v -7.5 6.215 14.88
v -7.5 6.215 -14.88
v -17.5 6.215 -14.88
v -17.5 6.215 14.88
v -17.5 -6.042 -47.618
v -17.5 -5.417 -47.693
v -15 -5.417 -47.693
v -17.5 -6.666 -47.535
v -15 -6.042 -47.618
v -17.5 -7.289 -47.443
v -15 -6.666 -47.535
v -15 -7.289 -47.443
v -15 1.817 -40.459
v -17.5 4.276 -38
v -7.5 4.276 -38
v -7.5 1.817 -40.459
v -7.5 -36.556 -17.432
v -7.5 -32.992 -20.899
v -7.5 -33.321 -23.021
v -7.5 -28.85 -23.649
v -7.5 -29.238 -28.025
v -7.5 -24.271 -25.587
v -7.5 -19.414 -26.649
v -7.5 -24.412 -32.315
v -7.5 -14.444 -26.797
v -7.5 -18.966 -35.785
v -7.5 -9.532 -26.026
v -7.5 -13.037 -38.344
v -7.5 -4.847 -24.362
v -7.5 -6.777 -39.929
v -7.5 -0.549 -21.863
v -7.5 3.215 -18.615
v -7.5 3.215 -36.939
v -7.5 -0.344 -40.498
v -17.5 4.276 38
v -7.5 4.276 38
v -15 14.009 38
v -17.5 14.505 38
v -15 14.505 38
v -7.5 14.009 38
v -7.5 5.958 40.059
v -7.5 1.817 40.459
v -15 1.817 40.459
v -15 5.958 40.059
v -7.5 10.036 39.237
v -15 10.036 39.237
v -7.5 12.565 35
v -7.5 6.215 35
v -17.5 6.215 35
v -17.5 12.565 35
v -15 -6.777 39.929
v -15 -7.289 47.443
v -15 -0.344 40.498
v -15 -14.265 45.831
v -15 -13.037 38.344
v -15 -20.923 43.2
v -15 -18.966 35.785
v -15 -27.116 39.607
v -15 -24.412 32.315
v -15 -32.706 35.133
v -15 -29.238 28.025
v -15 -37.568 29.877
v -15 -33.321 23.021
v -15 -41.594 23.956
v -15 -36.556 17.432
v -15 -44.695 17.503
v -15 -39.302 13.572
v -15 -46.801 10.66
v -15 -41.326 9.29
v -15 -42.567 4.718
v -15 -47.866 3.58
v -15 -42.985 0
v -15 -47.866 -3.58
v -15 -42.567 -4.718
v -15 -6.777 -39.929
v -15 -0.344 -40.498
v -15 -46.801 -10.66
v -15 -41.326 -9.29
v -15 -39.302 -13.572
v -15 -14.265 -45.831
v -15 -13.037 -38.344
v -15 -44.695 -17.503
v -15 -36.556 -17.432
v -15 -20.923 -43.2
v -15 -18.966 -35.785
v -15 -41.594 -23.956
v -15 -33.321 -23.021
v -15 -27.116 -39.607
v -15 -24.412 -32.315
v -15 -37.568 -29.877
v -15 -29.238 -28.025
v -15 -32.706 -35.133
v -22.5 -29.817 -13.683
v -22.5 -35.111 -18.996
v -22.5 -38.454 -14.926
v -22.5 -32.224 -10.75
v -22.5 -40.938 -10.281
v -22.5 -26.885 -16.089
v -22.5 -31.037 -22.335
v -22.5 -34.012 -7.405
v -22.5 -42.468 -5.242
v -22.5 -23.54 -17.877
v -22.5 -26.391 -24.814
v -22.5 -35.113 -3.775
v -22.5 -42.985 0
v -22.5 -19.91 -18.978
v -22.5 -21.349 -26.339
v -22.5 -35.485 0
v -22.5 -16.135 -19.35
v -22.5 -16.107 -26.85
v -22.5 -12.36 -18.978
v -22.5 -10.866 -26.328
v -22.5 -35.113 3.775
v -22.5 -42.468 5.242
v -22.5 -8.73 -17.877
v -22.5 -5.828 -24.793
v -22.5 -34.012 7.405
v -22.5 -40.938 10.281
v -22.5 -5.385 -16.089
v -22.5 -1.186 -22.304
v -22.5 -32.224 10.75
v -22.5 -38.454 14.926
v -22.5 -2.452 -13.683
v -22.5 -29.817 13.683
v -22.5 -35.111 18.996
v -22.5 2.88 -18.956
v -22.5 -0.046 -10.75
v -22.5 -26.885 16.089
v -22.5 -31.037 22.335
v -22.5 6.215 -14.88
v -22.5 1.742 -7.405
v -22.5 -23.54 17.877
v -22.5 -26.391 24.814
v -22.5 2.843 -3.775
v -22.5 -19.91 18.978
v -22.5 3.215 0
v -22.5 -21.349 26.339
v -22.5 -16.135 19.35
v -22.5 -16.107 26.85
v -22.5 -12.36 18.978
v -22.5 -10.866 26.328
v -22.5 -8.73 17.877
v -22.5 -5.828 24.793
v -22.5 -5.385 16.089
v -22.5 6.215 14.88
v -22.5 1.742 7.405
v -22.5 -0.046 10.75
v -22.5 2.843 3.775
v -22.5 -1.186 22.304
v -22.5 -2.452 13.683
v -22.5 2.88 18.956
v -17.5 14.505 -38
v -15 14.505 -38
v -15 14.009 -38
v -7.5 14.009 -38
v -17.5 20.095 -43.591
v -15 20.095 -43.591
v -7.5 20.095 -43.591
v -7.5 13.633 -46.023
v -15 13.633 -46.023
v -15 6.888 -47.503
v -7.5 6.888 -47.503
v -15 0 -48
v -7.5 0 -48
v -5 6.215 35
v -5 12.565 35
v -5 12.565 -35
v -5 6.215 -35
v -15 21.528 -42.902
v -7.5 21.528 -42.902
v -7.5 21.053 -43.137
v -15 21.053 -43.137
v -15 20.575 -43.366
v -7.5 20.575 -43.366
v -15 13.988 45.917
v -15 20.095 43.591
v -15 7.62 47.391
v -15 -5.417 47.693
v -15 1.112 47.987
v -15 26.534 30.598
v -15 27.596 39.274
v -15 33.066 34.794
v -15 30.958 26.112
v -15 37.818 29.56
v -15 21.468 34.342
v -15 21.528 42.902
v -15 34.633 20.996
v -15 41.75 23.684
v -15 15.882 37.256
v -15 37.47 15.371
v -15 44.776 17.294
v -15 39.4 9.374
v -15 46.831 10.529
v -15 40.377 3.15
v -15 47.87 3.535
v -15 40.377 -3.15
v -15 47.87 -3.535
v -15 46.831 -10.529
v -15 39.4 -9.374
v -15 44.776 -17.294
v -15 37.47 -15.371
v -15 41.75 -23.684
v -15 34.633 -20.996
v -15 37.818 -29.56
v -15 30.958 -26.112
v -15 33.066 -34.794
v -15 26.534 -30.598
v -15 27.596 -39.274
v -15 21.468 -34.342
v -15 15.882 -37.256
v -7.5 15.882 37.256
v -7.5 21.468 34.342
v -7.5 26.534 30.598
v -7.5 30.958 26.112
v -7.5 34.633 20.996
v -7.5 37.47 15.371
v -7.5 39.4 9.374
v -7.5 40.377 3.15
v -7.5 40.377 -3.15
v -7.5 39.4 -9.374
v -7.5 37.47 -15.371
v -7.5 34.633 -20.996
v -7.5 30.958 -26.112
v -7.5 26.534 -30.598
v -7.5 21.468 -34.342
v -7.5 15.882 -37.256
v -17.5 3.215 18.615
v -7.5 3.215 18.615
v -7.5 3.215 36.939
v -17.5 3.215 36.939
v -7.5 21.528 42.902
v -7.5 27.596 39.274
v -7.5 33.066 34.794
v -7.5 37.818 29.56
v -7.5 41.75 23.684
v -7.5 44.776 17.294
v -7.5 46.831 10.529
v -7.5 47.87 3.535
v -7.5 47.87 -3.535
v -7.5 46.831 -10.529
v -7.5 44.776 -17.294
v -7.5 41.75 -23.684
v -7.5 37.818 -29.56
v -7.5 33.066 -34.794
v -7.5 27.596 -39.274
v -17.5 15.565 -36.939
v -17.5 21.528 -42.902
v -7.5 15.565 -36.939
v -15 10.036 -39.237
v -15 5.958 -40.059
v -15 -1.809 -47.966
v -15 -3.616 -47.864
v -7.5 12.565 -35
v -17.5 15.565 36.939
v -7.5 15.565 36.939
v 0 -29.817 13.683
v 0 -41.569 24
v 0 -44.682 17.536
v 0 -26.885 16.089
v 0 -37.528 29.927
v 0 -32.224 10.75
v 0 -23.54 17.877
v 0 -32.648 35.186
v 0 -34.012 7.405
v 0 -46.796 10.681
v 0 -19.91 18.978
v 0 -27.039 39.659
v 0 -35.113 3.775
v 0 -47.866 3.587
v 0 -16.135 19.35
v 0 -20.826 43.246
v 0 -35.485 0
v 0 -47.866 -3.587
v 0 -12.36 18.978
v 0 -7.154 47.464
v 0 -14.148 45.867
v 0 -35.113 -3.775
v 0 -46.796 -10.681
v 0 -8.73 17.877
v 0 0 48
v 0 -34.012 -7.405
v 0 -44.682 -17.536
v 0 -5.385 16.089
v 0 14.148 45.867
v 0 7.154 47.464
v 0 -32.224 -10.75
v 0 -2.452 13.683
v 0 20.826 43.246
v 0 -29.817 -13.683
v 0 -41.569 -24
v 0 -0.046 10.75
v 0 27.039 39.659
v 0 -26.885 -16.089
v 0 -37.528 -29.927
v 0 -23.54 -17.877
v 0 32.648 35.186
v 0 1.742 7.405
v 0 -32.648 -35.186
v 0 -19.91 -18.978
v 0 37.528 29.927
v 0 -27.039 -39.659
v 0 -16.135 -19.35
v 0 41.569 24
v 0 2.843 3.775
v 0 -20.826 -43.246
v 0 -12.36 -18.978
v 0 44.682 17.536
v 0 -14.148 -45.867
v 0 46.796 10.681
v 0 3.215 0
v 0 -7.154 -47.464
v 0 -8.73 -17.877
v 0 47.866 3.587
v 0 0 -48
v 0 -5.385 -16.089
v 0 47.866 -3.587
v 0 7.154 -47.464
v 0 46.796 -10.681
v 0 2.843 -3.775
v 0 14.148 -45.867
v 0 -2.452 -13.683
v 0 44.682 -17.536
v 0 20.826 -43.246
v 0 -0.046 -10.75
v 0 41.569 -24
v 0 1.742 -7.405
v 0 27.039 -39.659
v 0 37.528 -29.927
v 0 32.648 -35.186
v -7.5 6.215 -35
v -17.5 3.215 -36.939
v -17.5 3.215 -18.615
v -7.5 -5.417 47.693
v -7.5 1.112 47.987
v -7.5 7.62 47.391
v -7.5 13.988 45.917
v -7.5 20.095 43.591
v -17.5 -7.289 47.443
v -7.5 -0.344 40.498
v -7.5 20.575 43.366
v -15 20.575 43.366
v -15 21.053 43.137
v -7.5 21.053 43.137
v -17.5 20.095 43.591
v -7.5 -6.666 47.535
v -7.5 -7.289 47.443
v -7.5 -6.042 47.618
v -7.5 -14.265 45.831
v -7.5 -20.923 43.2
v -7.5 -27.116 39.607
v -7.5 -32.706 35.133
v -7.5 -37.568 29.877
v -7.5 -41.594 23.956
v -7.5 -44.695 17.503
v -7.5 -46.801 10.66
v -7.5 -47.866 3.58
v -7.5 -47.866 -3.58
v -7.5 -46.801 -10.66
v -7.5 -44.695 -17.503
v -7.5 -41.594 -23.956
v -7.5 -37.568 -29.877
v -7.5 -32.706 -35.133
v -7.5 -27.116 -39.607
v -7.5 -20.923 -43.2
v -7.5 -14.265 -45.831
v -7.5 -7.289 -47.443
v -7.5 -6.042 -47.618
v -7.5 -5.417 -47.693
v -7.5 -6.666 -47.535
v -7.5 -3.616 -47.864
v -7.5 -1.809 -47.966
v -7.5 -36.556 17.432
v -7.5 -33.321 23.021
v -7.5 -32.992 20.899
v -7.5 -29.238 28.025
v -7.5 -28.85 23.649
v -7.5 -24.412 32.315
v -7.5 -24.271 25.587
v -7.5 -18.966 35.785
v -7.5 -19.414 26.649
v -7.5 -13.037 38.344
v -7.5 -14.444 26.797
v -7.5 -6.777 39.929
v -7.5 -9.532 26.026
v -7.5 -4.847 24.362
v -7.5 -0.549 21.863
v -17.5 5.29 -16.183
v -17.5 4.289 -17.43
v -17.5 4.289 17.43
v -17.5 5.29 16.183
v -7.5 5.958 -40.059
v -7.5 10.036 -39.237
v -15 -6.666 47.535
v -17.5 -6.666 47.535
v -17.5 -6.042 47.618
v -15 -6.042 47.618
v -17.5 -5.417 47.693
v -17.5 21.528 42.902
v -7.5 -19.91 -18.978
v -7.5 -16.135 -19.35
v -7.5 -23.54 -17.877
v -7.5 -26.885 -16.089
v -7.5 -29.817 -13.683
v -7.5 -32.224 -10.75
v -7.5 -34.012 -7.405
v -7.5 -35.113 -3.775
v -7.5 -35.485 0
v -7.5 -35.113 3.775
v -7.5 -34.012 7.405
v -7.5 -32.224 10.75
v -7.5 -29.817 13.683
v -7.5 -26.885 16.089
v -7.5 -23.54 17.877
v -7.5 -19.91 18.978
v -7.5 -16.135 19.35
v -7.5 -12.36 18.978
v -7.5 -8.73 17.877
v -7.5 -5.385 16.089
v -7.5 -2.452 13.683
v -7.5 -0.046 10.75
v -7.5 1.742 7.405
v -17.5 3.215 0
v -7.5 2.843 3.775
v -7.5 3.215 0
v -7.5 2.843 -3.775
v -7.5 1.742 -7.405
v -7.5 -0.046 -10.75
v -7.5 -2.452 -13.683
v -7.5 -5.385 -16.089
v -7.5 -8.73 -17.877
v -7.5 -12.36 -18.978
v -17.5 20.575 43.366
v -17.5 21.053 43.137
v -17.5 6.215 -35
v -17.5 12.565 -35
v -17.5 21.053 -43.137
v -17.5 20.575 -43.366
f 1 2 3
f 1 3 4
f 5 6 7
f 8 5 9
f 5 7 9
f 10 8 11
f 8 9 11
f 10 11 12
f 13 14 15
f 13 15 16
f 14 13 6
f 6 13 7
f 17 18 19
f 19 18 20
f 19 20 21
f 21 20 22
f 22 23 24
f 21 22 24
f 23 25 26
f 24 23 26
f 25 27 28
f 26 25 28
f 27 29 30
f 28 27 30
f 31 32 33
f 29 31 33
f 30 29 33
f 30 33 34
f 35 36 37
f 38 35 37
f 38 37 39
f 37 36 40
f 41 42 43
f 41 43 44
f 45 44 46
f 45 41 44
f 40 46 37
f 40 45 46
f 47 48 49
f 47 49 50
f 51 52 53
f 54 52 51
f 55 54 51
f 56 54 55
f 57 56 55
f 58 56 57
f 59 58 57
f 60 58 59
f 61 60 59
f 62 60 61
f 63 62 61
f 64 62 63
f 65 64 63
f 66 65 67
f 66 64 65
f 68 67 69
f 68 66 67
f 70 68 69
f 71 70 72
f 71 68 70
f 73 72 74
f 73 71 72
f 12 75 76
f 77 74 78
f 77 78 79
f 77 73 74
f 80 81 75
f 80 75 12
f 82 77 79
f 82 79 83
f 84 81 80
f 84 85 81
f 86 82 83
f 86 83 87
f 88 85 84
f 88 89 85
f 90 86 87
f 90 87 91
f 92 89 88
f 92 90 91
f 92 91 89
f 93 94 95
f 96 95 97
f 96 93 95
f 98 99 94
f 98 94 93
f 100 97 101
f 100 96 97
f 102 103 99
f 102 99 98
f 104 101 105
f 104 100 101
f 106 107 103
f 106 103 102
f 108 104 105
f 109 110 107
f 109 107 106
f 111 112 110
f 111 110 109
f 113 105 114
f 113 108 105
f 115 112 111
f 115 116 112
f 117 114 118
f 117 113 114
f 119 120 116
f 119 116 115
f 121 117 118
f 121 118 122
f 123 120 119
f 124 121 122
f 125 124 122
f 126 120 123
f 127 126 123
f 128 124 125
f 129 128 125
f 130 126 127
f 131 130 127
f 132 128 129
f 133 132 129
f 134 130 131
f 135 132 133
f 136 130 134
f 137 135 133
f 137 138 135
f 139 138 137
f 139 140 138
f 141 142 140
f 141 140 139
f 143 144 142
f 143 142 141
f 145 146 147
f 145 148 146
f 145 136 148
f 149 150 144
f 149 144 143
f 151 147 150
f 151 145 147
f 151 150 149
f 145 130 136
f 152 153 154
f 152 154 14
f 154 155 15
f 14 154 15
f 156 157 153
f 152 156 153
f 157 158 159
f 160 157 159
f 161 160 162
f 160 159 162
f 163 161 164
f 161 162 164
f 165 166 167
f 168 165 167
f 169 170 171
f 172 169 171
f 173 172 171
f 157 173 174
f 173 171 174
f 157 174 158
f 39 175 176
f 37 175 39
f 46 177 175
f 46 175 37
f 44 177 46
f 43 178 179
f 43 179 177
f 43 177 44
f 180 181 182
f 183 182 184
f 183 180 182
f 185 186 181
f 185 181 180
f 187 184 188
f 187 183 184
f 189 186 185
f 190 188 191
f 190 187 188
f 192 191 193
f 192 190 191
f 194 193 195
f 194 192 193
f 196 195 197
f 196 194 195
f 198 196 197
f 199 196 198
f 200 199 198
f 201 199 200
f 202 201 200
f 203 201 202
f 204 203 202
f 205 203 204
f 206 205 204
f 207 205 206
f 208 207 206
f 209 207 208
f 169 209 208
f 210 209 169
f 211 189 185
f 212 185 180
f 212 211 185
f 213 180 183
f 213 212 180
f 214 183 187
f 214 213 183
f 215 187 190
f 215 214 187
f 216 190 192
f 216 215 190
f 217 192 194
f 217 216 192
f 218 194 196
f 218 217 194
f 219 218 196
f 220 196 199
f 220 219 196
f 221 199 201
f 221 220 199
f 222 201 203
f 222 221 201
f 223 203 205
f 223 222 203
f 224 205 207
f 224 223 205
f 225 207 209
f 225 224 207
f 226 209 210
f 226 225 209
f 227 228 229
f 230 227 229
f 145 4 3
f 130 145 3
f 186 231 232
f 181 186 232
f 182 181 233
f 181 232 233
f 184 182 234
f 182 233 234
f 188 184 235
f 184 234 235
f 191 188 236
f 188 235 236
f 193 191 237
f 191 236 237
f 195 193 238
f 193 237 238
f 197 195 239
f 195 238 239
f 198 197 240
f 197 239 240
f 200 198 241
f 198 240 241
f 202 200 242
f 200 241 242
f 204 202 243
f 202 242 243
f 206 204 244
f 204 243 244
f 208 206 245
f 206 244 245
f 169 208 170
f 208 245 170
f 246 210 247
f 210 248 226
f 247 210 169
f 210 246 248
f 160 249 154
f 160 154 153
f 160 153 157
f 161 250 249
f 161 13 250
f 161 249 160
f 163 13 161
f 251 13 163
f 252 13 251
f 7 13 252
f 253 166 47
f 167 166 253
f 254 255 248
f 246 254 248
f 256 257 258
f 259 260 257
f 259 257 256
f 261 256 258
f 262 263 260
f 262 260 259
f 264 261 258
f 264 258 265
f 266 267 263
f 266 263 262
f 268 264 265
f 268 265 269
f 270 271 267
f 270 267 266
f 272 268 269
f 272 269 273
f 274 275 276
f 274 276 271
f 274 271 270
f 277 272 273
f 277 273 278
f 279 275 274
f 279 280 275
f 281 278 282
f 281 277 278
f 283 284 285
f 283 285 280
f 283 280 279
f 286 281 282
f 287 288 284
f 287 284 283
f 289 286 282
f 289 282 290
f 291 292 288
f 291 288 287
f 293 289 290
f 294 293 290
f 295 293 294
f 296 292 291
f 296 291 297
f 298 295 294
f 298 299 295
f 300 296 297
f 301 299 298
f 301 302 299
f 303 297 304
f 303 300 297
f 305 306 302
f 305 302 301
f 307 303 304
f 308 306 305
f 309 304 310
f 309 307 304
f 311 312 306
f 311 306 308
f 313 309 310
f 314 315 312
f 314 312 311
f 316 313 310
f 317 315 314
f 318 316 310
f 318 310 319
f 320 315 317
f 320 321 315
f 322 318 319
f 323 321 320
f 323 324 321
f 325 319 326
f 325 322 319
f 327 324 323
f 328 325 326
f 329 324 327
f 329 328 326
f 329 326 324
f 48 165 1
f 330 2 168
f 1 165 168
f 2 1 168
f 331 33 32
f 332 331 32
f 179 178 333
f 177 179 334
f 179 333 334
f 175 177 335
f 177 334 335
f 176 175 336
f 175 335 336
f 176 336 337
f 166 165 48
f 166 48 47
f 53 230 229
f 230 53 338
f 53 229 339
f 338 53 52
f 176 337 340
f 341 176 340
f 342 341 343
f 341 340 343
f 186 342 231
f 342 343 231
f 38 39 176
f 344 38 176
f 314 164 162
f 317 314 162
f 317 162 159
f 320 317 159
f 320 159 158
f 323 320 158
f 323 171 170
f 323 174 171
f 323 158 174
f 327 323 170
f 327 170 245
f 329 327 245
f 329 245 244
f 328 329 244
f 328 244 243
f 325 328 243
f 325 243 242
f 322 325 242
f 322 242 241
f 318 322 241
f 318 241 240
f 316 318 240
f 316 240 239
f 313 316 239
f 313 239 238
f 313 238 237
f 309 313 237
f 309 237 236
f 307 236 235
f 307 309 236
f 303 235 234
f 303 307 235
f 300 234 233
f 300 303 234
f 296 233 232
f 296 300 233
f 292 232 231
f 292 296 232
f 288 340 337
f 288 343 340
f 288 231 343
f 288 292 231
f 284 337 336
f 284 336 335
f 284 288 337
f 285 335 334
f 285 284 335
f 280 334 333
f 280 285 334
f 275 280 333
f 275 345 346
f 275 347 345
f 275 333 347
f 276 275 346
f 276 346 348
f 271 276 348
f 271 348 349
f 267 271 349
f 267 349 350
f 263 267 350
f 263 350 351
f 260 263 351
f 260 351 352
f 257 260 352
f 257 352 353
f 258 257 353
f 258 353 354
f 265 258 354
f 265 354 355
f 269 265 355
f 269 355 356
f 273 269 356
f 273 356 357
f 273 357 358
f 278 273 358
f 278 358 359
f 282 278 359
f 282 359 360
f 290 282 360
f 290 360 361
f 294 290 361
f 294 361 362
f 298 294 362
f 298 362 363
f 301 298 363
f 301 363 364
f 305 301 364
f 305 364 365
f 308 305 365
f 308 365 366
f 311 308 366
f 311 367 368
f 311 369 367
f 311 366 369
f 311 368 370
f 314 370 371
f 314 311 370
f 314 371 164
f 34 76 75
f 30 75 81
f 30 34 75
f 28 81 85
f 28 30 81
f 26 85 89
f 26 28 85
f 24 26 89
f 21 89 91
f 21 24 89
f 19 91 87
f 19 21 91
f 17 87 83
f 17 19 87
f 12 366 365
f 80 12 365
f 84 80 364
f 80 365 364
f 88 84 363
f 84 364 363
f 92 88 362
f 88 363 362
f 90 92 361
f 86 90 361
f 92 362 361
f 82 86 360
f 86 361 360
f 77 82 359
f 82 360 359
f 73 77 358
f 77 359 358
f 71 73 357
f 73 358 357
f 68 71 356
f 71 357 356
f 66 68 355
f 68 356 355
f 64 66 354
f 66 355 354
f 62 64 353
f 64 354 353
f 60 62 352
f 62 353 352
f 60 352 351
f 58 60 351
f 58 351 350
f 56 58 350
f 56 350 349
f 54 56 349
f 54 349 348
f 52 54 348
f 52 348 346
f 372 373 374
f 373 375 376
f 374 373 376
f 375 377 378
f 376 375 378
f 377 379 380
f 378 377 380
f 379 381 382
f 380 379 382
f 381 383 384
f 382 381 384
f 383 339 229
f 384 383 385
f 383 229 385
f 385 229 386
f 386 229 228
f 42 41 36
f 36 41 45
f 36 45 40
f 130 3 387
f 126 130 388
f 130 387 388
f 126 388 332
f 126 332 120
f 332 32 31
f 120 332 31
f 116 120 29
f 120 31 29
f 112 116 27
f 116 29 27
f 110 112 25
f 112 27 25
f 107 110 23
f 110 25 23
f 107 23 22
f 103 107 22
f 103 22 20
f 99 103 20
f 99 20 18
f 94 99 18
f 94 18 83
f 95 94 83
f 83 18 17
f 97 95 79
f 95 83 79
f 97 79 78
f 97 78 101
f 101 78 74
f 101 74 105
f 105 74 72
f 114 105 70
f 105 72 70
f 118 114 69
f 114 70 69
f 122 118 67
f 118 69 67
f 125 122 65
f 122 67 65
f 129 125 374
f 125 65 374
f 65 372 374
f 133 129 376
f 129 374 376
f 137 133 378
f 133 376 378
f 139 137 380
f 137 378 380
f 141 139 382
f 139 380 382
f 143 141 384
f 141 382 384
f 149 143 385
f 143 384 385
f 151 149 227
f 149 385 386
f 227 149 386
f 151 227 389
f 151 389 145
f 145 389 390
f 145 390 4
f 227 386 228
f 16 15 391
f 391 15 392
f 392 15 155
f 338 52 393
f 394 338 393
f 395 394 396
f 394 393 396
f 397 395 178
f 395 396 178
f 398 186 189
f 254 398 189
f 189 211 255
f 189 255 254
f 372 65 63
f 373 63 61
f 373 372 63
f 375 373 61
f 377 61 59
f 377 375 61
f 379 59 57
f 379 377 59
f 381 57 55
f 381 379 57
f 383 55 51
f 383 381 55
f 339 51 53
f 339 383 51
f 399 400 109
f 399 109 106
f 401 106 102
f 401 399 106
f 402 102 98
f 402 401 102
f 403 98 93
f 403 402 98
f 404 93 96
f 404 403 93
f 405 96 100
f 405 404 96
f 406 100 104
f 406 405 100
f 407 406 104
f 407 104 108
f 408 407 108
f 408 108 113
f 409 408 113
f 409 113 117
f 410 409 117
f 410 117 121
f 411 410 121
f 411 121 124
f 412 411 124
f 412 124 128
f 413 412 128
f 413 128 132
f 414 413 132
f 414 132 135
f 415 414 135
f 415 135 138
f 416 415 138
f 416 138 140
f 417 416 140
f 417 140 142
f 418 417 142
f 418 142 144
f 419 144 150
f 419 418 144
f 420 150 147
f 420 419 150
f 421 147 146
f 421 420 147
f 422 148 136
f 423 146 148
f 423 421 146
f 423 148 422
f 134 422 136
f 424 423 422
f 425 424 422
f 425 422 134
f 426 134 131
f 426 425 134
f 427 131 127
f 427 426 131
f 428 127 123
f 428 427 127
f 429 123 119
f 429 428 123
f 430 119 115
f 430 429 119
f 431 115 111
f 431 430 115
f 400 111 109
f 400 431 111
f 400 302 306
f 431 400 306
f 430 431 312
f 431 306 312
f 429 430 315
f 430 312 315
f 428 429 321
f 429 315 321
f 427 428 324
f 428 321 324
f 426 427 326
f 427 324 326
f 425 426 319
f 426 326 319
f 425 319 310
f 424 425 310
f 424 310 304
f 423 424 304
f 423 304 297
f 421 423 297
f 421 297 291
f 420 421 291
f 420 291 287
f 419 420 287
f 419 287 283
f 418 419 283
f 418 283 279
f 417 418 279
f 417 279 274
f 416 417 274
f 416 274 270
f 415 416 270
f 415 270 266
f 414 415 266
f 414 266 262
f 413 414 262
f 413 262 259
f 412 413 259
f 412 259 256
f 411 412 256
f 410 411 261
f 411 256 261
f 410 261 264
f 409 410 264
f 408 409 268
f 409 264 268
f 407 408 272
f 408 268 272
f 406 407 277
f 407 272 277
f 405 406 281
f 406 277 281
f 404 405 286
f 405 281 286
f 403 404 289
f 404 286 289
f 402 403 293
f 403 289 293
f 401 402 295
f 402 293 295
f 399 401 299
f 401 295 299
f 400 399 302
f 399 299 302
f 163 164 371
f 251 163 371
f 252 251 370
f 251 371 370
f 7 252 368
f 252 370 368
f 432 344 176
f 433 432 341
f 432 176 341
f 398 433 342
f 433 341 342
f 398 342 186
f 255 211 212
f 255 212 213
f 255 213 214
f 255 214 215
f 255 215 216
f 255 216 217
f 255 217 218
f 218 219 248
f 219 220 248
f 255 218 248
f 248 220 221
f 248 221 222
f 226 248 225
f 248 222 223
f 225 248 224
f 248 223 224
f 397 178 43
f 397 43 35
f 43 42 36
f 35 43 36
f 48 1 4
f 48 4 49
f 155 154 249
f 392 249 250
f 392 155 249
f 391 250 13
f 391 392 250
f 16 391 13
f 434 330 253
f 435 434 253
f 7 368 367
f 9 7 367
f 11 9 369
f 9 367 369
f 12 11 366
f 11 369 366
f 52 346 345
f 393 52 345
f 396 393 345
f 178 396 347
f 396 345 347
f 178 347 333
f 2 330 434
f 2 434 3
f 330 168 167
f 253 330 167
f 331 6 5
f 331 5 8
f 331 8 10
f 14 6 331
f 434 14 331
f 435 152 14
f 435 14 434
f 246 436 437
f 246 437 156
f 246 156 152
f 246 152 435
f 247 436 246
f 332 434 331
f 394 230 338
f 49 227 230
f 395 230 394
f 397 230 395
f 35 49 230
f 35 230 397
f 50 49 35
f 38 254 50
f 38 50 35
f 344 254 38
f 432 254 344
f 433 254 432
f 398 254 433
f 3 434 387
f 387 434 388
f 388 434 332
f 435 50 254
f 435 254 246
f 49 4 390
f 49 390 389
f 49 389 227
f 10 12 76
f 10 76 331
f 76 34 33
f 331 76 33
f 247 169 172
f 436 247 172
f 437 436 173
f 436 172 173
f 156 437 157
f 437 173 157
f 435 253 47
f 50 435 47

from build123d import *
from build123d.topology import SkipClean

# Parameters (mm, degrees)
SKETCH1_R           = 47.99995
SKETCH1_R_2         = 19.35
SKETCH1_W           = 70
SKETCH1_H           = 6.35
BOSS_EXTRUDE1_DEPTH = 7.5
SKETCH1_3_W         = 70
SKETCH1_3_H         = 6.35
BOSS_EXTRUDE2_DEPTH = 5
SKETCH2_W           = 70
SKETCH2_H           = 6.35
BOSS_EXTRUDE3_DEPTH = 10
SKETCH3_R           = 19.35
BOSS_EXTRUDE4_DEPTH = 15
SKETCH4_R           = 47.99995
SKETCH4_R_2         = 40.49995
BOSS_EXTRUDE5_DEPTH = 7.5


with BuildPart() as part:
    # Sketch1 → Boss-Extrude1 (new body)
    with BuildSketch(Plane(origin=(0, 0, 0), x_dir=(0, 0, -1), z_dir=(1, 0, 0))):
        Circle(SKETCH1_R)
        with Locations((0, -16.134793457)):
            Circle(SKETCH1_R_2, mode=Mode.SUBTRACT)
        with Locations((0, 9.390206543)):
            Rectangle(SKETCH1_W, SKETCH1_H, mode=Mode.SUBTRACT)
    extrude(amount=-BOSS_EXTRUDE1_DEPTH)

    # Sketch1<3> → Boss-Extrude2 (add)
    with BuildSketch(Plane(origin=(0, 0, 0), x_dir=(0, 0, -1), z_dir=(1, 0, 0))):
        with Locations((0, 9.390206543)):
            Rectangle(SKETCH1_3_W, SKETCH1_3_H)
    extrude(amount=-BOSS_EXTRUDE2_DEPTH)

    # Sketch2 → Boss-Extrude3 (add)
    with SkipClean():  # the faces are left unmerged after this step: merging them gives an invalid solid
        with BuildSketch(Plane.ZY.offset(7.5)):
            with BuildLine():
                Line((-47.443323347, -7.288776975), (-36.939339828, 3.215206543))
                Line((-36.939339828, 3.215206543), (36.939339828, 3.215206543))
                Line((36.939339828, 3.215206543), (47.443323347, -7.288776975))
                ThreePointArc((47.443323347, -7.288776975), (47.577493547, -6.354314108), (47.693260005, -5.41739329))
                Line((47.693260005, -5.41739329), (38, 4.275866715))
                Line((38, 4.275866715), (38, 14.504546372))
                Line((38, 14.504546372), (43.590913129, 20.095459501))
                ThreePointArc((43.590913129, 20.095459501), (43.252246865, 20.814378231), (42.901724899, 21.527591614))
                Line((42.901724899, 21.527591614), (36.939339828, 15.565206543))
                Line((36.939339828, 15.565206543), (-36.939339828, 15.565206543))
                Line((-36.939339828, 15.565206543), (-42.901724899, 21.527591614))
                ThreePointArc((-42.901724899, 21.527591614), (-43.252246865, 20.814378231), (-43.590913129, 20.095459501))
                Line((-43.590913129, 20.095459501), (-38, 14.504546372))
                Line((-38, 14.504546372), (-38, 4.275866715))
                Line((-38, 4.275866715), (-47.693260005, -5.41739329))
                ThreePointArc((-47.693260005, -5.41739329), (-47.577493547, -6.354314108), (-47.443323347, -7.288776975))
            make_face()
            with Locations((0, 9.390206543)):
                Rectangle(SKETCH2_W, SKETCH2_H, mode=Mode.SUBTRACT)
        extrude(amount=BOSS_EXTRUDE3_DEPTH)

    # Sketch3 → Boss-Extrude4 (add)
    with SkipClean():  # the faces are left unmerged after this step: merging them gives an invalid solid
        with BuildSketch(Plane.ZY.offset(7.5)):
            with BuildLine():
                Line((14.879516121, 6.215206543), (-14.879516121, 6.215206543))
                ThreePointArc((-14.879516121, 6.215206543), (0, -42.984793457), (14.879516121, 6.215206543))
            make_face()
            with Locations(Location((0, -16.134793457, 0), (0, 0, 180))):
                Circle(SKETCH3_R, mode=Mode.SUBTRACT)
        extrude(amount=BOSS_EXTRUDE4_DEPTH)

    # Sketch4 → Boss-Extrude5 (add)
    with SkipClean():  # the faces are left unmerged after this step: merging them gives an invalid solid
        with BuildSketch(Plane.ZY.offset(7.5)):
            with Locations(Location((0, 0, 0), (0, 0, 180))):
                Circle(SKETCH4_R)
            Circle(SKETCH4_R_2, mode=Mode.SUBTRACT)
        extrude(amount=BOSS_EXTRUDE5_DEPTH)


solid = part.part
